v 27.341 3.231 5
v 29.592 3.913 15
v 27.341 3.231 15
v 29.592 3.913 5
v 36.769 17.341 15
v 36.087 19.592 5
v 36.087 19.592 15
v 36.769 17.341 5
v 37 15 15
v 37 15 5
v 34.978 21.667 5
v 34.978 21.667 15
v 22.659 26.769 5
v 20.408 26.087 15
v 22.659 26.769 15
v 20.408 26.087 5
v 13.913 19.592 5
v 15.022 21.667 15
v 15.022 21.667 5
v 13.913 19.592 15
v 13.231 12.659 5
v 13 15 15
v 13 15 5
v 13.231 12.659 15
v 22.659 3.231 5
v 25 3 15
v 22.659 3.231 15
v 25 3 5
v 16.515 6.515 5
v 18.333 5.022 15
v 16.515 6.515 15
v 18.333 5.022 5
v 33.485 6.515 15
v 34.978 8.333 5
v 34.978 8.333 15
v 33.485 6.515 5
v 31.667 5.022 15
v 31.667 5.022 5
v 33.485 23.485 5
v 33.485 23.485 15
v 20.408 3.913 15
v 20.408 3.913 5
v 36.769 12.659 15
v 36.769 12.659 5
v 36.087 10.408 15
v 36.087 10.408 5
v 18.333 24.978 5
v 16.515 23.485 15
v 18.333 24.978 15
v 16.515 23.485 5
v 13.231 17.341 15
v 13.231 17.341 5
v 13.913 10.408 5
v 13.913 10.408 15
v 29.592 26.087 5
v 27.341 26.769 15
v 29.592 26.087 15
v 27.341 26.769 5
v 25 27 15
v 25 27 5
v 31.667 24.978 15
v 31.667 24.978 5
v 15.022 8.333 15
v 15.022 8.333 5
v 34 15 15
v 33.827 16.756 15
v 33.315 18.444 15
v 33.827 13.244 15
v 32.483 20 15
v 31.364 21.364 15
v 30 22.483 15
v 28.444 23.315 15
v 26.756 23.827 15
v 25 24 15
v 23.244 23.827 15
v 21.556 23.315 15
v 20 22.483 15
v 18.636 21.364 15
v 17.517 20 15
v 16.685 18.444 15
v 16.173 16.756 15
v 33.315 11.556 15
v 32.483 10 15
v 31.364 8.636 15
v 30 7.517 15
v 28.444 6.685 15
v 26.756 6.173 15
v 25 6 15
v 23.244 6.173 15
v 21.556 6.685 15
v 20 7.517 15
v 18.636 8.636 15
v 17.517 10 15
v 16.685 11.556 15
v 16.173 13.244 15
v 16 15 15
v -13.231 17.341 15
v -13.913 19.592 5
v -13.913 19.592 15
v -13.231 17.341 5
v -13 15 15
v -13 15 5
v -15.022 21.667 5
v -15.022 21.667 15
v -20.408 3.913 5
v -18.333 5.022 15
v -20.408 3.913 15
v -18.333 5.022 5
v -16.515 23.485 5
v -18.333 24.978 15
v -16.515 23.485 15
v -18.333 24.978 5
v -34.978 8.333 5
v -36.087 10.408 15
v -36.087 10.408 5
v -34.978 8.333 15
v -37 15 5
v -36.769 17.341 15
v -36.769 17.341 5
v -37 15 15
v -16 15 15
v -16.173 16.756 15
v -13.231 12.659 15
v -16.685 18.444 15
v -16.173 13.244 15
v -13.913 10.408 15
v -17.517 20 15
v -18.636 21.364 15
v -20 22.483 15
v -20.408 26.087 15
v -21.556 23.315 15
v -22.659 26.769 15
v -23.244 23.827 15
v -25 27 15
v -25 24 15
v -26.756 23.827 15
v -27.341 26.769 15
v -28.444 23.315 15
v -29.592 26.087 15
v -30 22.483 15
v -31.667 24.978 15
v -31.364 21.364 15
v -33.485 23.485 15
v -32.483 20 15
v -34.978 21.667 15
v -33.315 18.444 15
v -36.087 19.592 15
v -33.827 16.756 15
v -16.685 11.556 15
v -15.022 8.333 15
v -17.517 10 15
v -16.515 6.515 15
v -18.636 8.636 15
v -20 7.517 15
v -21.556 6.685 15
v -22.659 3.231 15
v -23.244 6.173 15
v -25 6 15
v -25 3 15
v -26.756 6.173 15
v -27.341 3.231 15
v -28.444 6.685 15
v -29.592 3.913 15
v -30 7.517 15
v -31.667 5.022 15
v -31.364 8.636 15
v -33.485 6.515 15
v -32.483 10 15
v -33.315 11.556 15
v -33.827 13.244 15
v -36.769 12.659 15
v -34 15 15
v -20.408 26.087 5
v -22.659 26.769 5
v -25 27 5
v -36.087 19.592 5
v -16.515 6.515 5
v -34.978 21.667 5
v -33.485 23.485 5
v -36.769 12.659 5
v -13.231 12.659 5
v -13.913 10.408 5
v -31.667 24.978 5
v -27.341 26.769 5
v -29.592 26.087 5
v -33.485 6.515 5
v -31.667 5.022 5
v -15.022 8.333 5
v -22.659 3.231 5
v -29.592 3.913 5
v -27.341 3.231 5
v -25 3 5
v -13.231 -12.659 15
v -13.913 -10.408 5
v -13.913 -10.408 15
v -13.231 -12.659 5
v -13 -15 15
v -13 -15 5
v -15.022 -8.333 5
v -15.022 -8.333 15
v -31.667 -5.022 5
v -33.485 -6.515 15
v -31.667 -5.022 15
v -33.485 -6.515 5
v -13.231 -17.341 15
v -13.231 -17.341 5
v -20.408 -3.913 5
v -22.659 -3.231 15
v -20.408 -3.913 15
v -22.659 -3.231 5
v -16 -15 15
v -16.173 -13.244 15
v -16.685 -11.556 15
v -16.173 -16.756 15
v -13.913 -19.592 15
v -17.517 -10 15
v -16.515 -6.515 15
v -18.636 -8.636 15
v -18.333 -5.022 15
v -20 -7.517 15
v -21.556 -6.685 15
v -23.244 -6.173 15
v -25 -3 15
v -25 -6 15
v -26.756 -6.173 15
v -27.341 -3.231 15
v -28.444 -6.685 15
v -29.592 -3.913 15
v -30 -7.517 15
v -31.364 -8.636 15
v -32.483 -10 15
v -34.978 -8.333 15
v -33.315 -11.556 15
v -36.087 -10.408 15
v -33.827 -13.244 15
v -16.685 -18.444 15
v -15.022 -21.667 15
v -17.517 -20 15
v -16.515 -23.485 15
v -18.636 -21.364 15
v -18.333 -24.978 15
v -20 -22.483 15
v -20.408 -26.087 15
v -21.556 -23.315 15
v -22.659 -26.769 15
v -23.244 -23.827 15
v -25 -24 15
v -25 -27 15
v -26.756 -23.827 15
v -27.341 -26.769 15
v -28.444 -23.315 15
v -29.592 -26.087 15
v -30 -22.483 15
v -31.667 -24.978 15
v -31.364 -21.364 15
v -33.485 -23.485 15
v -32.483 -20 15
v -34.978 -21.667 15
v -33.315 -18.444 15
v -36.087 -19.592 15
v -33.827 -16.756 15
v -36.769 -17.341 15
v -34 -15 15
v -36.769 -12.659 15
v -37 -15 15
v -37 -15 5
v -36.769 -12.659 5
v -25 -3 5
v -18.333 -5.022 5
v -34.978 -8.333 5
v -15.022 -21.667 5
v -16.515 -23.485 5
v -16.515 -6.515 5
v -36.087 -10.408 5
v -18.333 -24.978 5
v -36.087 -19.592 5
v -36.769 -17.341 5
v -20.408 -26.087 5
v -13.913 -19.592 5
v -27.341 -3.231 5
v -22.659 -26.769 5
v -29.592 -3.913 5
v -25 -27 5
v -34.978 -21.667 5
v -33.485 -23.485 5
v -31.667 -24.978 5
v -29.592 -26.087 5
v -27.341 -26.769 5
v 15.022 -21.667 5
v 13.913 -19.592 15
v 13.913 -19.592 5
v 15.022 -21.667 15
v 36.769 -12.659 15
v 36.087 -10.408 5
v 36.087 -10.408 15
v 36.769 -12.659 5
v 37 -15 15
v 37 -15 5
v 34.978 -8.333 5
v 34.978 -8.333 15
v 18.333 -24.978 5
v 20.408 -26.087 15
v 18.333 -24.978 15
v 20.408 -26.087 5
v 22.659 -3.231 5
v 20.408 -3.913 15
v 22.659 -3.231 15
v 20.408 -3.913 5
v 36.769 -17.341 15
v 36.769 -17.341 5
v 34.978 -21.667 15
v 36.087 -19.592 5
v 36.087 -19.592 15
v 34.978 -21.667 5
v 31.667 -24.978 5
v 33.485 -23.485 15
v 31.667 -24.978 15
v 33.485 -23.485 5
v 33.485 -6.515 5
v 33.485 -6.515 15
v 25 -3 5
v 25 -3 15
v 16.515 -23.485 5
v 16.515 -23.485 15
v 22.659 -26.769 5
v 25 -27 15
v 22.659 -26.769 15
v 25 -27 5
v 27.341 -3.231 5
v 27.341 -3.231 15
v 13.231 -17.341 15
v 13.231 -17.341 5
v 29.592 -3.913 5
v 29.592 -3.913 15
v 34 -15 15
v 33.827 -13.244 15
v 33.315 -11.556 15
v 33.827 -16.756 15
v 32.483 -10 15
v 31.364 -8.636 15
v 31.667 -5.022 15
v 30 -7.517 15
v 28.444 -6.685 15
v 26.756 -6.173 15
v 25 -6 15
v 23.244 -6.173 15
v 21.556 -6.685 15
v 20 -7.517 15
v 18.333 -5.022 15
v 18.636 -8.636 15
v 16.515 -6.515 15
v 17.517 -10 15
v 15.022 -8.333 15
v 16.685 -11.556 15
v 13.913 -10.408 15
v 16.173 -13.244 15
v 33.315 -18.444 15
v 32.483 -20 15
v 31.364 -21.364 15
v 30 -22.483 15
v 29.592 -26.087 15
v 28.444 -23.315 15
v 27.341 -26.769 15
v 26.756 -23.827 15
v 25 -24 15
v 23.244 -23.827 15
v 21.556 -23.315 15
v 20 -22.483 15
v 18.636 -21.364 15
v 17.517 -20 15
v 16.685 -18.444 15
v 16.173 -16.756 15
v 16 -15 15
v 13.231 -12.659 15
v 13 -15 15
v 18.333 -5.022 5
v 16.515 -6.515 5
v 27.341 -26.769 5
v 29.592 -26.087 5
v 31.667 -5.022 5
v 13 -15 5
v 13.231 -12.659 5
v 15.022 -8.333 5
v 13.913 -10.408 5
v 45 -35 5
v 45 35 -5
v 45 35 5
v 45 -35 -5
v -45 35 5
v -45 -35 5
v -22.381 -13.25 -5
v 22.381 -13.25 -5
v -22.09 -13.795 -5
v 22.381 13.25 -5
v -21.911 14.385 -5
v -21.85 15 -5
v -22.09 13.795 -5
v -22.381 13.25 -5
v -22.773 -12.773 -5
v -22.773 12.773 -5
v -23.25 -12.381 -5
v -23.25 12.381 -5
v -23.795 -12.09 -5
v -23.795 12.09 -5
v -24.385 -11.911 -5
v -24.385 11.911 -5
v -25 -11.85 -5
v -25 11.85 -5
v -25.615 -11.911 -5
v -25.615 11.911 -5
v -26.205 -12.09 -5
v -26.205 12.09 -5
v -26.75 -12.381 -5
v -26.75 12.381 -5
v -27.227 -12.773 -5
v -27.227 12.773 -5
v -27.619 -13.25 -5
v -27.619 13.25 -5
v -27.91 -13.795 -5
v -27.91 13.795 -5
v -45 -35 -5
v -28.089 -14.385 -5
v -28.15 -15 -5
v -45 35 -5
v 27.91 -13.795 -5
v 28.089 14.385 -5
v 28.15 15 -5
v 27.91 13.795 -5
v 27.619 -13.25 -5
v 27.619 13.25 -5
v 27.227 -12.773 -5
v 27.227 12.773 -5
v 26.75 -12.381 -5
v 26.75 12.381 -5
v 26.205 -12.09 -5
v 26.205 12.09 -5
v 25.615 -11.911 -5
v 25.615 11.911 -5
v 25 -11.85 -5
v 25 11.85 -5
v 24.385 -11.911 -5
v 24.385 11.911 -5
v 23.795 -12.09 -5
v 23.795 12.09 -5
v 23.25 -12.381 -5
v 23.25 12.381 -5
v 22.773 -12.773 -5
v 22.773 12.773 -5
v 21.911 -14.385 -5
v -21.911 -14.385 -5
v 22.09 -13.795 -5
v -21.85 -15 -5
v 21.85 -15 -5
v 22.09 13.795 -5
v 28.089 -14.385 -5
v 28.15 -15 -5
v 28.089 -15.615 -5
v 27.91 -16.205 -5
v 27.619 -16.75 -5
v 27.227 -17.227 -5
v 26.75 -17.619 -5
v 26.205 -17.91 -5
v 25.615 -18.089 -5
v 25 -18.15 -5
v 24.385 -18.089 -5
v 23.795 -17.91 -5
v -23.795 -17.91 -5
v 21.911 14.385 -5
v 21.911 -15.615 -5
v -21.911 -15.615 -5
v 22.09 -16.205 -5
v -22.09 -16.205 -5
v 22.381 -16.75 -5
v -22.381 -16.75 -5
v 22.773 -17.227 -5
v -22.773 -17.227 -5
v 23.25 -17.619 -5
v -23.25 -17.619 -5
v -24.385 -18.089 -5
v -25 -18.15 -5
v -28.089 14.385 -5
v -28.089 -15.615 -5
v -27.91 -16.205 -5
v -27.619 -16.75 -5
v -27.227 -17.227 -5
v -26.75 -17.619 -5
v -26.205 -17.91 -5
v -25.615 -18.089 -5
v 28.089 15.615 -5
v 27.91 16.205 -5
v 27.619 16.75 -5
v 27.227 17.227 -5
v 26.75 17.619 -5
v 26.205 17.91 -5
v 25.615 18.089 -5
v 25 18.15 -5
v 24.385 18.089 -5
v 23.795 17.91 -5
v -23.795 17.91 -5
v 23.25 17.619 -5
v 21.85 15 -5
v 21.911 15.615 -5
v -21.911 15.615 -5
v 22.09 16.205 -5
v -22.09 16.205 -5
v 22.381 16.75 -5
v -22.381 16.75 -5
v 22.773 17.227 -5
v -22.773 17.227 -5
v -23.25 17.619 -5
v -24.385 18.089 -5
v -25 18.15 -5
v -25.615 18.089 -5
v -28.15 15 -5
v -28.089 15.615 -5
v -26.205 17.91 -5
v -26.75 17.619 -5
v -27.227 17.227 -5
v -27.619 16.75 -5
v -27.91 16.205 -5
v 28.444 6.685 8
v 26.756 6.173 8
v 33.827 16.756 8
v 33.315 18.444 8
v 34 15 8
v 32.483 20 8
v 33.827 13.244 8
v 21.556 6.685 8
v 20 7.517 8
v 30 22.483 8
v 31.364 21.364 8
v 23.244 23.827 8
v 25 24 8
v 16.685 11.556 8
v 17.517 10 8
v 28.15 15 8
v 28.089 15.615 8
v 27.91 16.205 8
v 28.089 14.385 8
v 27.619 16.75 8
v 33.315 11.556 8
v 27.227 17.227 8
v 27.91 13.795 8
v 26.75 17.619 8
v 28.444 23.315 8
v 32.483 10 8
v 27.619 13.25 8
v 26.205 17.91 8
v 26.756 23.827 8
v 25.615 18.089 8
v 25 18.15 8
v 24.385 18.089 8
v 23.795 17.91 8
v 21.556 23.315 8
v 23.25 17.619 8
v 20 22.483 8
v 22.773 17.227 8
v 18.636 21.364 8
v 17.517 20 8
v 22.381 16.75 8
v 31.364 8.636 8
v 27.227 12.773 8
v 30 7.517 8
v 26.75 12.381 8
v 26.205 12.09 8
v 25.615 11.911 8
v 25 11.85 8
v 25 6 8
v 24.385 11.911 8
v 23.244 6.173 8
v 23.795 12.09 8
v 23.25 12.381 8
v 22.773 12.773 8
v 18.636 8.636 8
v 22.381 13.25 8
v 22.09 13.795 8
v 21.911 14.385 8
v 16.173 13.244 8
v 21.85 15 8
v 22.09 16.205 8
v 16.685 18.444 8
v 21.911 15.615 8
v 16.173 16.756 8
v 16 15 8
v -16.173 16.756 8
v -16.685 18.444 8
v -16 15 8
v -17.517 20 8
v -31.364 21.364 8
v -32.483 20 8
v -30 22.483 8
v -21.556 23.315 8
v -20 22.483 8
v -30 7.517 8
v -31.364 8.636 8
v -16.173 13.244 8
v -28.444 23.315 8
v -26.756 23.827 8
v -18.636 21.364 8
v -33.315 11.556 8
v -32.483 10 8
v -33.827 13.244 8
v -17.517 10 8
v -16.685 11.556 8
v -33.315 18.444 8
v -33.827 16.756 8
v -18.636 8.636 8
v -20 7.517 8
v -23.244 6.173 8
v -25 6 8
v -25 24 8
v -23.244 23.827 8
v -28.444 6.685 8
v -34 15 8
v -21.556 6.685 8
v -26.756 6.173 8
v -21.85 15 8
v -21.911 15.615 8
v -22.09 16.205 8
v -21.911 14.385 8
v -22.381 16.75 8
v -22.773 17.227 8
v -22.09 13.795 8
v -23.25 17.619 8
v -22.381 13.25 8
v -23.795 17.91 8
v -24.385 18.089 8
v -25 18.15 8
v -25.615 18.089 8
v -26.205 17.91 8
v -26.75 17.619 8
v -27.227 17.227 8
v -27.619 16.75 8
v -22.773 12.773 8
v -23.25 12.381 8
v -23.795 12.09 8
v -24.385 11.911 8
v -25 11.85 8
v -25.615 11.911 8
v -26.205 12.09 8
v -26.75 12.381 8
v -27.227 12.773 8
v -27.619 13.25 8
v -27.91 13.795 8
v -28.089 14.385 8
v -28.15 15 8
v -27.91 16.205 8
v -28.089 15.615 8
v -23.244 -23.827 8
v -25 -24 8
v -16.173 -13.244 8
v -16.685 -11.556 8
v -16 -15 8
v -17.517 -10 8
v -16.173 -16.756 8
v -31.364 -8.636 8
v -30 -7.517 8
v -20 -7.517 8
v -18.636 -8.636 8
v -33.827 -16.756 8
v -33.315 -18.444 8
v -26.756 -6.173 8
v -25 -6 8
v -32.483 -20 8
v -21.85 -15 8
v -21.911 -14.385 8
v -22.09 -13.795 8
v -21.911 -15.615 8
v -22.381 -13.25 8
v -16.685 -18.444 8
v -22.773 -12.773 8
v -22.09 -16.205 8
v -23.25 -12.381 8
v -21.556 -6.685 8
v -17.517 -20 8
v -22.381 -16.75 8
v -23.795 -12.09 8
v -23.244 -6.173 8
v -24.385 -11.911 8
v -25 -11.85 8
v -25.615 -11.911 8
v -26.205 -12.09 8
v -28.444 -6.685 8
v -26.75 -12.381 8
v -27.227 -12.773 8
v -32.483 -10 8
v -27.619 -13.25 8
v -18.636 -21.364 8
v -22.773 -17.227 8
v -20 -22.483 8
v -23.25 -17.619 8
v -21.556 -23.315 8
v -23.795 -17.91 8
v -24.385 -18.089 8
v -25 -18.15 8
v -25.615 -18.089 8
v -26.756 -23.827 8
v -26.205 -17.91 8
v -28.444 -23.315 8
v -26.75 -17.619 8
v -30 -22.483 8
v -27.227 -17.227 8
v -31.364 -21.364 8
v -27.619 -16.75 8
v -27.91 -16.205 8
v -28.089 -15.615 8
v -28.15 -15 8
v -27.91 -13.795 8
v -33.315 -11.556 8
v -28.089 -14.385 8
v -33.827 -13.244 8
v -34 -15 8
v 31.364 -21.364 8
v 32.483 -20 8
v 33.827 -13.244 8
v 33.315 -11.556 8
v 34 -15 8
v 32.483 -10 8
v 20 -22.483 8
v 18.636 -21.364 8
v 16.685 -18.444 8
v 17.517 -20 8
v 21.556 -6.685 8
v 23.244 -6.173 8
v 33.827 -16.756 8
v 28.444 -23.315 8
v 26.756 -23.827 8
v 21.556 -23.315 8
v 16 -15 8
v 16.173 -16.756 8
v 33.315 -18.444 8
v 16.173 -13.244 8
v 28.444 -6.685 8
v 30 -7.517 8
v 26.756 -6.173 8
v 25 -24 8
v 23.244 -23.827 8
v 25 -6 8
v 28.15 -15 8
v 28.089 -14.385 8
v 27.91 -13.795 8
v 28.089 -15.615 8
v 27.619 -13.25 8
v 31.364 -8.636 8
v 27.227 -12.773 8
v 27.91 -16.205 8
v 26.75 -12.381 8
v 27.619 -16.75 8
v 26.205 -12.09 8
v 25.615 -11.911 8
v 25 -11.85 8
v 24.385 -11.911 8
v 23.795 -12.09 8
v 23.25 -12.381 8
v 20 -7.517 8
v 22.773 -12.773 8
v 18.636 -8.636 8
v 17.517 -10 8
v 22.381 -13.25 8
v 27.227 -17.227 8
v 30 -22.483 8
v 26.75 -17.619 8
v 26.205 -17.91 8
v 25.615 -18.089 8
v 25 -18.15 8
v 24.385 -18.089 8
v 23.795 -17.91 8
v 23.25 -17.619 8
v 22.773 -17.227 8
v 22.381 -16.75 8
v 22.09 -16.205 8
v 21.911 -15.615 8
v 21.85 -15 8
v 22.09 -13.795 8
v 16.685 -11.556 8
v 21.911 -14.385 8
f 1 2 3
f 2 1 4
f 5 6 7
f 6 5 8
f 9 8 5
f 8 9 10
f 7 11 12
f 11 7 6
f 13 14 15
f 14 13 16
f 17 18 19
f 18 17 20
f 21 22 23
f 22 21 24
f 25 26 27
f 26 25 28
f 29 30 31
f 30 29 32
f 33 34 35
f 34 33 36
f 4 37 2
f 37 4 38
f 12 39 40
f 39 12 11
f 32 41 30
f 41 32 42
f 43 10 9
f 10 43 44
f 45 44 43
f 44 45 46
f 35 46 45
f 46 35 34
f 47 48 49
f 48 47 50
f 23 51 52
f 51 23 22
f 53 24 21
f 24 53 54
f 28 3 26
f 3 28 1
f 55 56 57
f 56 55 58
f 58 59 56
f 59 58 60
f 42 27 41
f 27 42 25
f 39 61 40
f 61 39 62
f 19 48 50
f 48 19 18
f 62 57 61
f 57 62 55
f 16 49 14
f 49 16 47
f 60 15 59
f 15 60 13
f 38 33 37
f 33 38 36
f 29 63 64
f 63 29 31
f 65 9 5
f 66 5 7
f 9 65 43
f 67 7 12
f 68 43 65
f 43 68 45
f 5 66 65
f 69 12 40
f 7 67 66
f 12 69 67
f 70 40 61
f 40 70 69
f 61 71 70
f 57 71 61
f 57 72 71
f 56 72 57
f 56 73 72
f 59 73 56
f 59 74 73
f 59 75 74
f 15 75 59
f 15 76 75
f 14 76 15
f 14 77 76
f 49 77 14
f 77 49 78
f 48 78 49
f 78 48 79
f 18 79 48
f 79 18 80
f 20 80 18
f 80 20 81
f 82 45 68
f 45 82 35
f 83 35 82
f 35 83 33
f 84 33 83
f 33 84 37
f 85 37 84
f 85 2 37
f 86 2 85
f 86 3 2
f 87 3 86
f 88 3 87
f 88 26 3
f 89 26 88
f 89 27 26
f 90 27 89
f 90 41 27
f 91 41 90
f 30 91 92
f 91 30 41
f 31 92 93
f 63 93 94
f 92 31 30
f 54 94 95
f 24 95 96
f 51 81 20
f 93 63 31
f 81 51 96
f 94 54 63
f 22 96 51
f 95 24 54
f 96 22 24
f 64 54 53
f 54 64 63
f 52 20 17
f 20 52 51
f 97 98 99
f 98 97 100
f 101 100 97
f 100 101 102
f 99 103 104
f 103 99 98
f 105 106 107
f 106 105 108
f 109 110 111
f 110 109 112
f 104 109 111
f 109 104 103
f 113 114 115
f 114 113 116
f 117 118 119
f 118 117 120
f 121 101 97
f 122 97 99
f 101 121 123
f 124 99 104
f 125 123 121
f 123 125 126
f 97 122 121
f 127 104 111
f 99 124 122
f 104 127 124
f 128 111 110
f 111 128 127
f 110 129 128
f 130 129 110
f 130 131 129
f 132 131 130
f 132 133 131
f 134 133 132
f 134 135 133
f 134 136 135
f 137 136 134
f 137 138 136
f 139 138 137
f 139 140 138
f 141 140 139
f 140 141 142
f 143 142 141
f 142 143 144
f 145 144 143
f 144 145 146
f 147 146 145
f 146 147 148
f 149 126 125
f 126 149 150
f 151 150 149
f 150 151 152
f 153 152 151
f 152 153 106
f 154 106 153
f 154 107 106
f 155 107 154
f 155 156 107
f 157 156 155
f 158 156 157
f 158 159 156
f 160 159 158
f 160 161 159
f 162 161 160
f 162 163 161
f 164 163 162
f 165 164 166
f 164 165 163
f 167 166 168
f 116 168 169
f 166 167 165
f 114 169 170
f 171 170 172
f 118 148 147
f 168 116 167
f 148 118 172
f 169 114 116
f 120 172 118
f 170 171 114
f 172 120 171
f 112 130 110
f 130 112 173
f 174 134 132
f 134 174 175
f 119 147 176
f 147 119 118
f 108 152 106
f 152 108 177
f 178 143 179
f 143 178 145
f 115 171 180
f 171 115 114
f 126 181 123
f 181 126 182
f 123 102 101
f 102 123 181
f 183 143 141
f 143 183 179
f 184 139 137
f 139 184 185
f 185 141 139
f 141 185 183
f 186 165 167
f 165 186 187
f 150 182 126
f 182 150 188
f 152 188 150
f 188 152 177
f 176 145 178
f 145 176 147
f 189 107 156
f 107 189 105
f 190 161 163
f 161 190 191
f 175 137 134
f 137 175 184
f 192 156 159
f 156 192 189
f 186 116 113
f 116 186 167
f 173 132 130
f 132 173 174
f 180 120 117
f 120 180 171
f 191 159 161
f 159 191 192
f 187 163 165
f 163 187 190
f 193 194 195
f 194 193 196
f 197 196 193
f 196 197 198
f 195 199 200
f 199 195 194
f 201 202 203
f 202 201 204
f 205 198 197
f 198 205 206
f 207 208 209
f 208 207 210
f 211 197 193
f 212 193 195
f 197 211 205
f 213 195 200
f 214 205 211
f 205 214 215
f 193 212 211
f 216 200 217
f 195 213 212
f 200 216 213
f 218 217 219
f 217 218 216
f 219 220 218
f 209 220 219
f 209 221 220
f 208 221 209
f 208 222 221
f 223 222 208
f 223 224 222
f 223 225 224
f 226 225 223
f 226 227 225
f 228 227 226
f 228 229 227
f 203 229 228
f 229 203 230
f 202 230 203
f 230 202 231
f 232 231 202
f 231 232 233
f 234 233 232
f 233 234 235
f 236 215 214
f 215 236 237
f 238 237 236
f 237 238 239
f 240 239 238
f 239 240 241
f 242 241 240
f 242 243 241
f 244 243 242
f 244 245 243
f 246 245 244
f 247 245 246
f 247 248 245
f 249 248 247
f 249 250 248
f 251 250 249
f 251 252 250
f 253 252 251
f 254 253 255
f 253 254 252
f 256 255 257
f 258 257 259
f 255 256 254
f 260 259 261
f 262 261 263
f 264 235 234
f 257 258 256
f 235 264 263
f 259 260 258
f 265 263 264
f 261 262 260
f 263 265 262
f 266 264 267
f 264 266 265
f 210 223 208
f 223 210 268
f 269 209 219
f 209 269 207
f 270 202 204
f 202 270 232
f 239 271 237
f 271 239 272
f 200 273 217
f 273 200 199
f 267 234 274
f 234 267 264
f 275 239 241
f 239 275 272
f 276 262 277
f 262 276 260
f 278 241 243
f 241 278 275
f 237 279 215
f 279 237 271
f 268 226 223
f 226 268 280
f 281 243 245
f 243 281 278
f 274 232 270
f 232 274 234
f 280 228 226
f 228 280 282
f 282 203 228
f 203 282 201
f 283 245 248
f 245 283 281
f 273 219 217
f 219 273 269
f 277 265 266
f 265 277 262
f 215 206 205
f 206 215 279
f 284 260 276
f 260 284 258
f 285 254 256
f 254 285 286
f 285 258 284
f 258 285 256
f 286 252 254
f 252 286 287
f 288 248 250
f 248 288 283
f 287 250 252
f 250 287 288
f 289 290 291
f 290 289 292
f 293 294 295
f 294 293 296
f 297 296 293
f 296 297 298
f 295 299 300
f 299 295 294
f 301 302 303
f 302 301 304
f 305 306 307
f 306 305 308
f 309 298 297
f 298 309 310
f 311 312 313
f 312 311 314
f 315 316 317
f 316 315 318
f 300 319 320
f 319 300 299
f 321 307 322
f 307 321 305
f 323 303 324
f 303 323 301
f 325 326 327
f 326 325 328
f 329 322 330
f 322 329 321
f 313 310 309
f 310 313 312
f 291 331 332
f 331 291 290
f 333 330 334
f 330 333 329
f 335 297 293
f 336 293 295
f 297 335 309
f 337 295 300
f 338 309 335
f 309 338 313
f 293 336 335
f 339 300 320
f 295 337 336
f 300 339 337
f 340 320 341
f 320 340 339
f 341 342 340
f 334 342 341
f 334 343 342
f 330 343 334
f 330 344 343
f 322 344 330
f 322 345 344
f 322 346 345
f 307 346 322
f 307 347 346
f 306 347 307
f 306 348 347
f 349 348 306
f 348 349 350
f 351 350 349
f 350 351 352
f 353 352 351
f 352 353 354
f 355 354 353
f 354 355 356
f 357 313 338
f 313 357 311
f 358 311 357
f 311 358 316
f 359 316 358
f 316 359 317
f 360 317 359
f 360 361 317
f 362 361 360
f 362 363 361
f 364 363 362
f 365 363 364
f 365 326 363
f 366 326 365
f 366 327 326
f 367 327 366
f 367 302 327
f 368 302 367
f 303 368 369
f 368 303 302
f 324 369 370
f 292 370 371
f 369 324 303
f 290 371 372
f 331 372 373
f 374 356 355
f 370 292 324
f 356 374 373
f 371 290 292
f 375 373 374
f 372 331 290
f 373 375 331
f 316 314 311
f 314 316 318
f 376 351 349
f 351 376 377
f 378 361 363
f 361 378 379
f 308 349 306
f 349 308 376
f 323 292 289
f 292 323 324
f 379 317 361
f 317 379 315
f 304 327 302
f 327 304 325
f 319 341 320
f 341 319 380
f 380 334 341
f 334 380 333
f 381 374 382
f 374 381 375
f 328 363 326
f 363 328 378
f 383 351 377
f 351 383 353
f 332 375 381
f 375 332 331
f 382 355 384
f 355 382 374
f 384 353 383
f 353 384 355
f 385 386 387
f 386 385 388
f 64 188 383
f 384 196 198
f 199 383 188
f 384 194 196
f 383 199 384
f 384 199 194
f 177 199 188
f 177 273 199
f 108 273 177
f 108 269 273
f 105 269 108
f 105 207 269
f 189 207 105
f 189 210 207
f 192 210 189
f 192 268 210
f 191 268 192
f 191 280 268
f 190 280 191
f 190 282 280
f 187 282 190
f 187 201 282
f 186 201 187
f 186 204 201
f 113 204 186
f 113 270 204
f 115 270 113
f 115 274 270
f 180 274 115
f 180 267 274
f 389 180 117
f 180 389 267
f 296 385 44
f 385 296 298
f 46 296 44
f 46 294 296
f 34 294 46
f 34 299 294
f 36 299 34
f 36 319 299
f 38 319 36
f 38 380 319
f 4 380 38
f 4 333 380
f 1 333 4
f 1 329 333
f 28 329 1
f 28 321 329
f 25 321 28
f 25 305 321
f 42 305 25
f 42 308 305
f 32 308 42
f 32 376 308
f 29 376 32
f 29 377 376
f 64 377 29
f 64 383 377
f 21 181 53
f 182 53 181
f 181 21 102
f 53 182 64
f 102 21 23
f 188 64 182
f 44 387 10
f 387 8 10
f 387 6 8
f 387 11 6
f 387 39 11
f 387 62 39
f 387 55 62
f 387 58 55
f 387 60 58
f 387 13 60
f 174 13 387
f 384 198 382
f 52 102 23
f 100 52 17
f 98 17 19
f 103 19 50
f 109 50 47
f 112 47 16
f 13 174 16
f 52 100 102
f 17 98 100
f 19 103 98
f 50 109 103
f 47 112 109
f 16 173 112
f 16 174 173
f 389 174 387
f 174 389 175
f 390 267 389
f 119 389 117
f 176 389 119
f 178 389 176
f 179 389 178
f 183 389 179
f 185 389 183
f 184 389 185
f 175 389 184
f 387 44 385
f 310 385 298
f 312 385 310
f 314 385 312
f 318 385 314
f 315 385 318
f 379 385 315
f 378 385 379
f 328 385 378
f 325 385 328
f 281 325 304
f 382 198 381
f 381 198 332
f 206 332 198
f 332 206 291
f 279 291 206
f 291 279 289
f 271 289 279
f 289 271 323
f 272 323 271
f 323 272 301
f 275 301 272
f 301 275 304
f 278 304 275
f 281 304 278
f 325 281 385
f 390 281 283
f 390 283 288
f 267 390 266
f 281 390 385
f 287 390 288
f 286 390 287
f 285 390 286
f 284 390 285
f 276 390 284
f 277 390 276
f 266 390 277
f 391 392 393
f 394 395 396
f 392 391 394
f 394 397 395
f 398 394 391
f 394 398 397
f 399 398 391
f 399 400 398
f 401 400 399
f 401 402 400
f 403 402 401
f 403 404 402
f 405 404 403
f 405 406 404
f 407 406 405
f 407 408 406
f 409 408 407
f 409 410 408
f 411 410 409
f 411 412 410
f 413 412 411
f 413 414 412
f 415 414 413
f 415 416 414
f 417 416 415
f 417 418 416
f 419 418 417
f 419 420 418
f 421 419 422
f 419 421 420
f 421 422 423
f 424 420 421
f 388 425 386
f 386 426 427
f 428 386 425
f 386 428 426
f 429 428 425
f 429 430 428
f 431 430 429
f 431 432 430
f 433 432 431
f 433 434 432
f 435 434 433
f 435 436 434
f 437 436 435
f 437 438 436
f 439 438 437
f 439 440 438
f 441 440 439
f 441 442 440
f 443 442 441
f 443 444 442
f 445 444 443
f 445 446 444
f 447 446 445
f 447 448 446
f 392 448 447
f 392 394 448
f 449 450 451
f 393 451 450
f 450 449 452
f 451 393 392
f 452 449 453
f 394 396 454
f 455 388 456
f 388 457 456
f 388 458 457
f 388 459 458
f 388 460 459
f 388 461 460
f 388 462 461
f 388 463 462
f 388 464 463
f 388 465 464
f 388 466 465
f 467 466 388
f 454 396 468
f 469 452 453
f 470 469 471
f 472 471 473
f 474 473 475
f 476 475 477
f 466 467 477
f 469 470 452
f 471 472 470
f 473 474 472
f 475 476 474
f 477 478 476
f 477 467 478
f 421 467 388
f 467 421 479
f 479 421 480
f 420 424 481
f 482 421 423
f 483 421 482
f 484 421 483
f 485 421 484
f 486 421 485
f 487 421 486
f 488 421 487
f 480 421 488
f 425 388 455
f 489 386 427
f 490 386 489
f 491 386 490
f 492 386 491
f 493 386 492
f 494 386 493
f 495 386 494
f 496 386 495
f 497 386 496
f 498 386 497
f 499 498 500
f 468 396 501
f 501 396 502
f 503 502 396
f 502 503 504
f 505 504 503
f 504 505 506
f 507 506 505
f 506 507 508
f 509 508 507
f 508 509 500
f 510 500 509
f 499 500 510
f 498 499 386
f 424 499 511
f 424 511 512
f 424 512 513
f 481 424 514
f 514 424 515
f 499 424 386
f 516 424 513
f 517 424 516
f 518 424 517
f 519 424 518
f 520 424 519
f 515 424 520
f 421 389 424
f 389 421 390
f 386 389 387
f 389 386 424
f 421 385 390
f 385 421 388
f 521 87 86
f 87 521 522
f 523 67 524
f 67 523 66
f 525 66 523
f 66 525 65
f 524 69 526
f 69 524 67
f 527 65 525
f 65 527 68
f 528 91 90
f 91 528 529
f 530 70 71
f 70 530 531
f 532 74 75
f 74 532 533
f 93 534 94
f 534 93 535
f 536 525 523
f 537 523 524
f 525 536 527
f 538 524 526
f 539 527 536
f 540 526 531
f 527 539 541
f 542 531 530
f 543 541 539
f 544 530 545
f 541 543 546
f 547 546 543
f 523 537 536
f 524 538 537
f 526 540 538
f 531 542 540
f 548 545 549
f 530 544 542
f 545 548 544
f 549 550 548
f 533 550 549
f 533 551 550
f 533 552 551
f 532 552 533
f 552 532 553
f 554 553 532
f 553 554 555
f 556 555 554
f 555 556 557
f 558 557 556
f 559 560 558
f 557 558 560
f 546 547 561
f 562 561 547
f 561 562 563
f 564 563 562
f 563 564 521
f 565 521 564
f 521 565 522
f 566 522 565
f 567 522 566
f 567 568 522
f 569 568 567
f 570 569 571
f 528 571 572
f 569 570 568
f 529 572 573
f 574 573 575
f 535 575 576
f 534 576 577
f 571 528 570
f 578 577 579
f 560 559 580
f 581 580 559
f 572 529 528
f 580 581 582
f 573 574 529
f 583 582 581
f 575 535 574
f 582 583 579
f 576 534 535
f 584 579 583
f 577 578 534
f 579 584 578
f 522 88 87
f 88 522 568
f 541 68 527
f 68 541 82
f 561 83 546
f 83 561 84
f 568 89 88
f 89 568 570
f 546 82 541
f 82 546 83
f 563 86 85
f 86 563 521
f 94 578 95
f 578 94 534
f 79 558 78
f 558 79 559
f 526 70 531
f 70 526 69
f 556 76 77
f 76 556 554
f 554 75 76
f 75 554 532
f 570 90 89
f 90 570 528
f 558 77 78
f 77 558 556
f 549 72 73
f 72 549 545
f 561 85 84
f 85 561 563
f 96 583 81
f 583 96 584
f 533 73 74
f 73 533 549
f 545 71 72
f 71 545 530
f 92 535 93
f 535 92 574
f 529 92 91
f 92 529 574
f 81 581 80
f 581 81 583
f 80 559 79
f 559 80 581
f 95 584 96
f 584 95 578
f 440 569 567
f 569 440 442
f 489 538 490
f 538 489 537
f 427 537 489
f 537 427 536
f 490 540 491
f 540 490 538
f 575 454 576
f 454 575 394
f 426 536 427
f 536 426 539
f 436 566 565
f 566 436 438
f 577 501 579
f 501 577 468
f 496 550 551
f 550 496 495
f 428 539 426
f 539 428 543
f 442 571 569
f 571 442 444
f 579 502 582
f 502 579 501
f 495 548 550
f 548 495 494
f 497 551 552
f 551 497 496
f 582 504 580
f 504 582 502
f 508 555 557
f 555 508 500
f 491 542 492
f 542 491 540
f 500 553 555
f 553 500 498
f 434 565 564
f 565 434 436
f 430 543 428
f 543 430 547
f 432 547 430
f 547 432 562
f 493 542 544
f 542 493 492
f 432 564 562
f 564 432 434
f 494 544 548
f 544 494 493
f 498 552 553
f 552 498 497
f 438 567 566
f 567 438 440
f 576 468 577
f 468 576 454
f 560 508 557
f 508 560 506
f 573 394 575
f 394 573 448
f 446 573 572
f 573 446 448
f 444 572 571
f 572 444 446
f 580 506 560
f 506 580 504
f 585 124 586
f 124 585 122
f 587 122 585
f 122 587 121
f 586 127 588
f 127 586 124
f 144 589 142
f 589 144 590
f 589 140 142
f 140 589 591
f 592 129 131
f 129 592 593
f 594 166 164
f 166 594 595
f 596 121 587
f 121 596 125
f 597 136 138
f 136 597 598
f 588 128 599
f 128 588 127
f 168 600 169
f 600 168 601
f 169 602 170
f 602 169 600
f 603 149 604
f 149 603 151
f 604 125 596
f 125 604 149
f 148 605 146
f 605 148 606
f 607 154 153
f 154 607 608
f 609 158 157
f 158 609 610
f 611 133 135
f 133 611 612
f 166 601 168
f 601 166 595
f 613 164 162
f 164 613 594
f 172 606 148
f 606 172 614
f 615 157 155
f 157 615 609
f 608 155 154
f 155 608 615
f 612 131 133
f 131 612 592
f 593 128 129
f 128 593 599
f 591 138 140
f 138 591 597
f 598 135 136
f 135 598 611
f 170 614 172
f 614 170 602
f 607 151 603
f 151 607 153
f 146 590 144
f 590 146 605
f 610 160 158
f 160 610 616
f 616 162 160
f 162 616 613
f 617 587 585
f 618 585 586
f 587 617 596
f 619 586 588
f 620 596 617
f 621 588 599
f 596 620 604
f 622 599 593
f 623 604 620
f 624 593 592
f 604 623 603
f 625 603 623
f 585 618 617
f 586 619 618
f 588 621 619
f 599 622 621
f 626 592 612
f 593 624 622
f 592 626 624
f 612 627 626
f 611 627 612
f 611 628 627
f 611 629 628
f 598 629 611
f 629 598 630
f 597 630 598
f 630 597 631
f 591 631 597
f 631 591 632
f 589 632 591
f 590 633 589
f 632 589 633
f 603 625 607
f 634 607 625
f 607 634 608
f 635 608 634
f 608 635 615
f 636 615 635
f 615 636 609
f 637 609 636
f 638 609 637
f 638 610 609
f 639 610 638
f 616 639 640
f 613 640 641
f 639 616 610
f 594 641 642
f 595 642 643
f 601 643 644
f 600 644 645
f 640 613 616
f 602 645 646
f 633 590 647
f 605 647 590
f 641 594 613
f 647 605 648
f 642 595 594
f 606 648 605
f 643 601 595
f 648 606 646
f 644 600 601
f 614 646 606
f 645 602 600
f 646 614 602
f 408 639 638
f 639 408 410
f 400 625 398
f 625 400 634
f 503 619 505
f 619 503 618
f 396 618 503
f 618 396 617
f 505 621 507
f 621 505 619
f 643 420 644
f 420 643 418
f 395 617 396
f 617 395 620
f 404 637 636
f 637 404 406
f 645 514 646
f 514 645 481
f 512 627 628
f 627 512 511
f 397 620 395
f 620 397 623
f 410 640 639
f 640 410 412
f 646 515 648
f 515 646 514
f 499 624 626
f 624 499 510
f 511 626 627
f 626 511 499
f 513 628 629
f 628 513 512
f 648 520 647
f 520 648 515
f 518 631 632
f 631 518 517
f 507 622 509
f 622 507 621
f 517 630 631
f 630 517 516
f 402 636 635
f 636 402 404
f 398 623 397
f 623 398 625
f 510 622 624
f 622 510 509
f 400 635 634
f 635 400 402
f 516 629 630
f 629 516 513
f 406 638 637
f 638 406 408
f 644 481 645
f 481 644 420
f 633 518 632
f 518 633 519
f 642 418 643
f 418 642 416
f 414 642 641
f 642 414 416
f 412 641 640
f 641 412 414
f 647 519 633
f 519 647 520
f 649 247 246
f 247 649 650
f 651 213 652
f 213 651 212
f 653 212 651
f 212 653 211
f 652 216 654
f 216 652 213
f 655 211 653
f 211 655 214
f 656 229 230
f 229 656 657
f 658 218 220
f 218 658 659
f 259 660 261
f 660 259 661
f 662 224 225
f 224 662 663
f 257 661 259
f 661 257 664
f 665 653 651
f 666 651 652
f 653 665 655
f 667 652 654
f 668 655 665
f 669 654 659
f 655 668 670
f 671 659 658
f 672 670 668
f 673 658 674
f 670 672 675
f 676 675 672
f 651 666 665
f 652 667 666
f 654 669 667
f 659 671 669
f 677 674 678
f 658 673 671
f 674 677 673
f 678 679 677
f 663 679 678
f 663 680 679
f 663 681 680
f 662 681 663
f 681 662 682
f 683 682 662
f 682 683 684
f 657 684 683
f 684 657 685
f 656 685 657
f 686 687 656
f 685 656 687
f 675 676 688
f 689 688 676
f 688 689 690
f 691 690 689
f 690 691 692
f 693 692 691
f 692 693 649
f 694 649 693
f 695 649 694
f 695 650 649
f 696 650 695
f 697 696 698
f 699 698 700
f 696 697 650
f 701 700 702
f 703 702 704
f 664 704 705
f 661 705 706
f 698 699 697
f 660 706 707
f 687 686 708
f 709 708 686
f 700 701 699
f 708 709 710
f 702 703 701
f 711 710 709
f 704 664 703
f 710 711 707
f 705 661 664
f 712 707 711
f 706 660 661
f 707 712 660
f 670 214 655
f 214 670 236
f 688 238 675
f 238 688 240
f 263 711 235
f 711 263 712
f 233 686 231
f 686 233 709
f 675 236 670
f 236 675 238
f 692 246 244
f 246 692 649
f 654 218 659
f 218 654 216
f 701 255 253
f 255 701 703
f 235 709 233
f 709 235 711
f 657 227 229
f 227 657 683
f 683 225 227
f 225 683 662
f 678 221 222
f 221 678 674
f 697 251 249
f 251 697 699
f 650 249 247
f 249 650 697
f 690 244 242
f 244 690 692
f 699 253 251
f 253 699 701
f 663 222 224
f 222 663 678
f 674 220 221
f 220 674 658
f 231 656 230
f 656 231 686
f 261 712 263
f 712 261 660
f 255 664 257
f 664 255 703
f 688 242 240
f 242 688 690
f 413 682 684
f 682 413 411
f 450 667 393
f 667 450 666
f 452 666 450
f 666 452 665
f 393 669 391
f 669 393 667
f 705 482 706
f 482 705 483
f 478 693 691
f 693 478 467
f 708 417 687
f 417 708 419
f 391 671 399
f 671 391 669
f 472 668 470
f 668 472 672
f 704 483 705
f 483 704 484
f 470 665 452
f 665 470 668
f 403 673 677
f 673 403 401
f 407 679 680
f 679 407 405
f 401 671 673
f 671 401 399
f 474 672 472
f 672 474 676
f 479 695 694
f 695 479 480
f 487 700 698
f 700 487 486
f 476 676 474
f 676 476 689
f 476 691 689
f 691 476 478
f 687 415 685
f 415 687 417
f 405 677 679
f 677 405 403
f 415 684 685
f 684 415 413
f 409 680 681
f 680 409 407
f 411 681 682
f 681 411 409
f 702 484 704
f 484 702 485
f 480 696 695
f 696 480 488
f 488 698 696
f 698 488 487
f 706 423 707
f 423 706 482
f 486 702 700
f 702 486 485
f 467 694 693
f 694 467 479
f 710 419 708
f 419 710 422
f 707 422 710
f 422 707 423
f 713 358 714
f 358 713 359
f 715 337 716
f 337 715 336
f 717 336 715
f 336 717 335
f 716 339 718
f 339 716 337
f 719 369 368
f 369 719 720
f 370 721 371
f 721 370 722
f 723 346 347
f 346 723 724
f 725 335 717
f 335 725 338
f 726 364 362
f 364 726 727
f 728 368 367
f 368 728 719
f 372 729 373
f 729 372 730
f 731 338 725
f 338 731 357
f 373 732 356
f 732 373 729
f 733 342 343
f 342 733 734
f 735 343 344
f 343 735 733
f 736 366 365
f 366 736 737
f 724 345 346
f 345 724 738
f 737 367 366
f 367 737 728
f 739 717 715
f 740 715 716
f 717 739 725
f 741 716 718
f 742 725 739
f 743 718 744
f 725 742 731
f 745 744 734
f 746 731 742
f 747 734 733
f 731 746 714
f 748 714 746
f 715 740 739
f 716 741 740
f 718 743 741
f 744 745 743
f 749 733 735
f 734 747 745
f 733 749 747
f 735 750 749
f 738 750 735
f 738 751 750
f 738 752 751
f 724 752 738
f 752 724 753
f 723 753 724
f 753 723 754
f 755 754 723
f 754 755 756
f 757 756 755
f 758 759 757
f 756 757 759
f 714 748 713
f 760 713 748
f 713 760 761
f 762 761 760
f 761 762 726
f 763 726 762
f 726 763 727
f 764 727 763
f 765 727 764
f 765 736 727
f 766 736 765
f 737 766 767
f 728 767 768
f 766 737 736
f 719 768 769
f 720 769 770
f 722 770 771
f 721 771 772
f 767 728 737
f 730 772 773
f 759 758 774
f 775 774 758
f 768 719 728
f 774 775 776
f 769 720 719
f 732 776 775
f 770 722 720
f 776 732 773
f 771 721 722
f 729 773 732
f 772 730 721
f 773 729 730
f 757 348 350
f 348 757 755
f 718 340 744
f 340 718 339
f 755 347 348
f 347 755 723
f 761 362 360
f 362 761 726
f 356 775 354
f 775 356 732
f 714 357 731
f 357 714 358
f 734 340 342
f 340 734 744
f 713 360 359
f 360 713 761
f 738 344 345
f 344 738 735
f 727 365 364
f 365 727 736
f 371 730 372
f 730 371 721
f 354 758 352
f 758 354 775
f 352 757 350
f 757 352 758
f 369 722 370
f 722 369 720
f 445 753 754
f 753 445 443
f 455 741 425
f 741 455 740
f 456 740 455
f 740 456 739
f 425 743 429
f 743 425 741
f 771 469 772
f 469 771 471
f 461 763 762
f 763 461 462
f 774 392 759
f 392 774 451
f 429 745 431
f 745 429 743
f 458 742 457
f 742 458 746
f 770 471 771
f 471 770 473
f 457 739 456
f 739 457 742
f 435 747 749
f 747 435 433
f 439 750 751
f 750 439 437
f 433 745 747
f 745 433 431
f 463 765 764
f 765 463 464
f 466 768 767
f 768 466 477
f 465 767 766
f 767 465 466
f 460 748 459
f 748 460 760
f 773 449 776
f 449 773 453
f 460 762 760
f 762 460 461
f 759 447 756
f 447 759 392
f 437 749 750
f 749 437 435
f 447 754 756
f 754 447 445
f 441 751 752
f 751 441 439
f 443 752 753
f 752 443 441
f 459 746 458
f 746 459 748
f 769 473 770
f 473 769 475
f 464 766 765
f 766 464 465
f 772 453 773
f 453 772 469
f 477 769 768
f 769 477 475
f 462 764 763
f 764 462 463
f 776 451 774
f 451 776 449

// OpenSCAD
$fn = 32;

// ----------------------------------------------------------------------
// Socket pad plate
// bosses with counterbored sockets for the screws
// ----------------------------------------------------------------------

// --- parameters (mm) ---
base_t = 10;           // base plate thickness
boss_h = 10;           // boss height above the base plate
boss_d = 24;           // boss diameter
socket_d = 18;         // socket diameter
socket_depth = 7;      // socket depth from the boss face
bolt_d = 6.3;          // screw clearance hole through the socket floor
plate = [90, 70, 10];  // overall size (x, y, z)
edge = 20;             // boss centre offset from the plate edge
pads = 4;              // boss count, one per corner

// --- derived feature positions (mm) ---
height = base_t + boss_h;        // = 20   overall height of the part
corner_x = plate[0] / 2 - edge;  // = 25   boss centre X
corner_y = plate[1] / 2 - edge;  // = 15   boss centre Y
feature_centers = [
  [corner_x, corner_y],
  [-corner_x, corner_y],
  [-corner_x, -corner_y],
  [corner_x, -corner_y]
];   // boss centres: sockets, holes and the pads themselves are placed from here

// base plate, bosses on feature_centers, socket + through hole in each
difference() {
  union() {
    cube(plate, center = true);
    for (centre = feature_centers)
      translate([centre[0], centre[1], plate[2] / 2 - 1])
        cylinder(d = boss_d, h = boss_h + 1);
  }
  for (centre = feature_centers) {
    translate([centre[0], centre[1], plate[2] / 2 + boss_h - socket_depth])
      cylinder(d = socket_d, h = socket_depth + 1);
    translate([centre[0], centre[1], -height])
      cylinder(d = bolt_d, h = 2 * height + 2);  // through the socket floor
  }
}
